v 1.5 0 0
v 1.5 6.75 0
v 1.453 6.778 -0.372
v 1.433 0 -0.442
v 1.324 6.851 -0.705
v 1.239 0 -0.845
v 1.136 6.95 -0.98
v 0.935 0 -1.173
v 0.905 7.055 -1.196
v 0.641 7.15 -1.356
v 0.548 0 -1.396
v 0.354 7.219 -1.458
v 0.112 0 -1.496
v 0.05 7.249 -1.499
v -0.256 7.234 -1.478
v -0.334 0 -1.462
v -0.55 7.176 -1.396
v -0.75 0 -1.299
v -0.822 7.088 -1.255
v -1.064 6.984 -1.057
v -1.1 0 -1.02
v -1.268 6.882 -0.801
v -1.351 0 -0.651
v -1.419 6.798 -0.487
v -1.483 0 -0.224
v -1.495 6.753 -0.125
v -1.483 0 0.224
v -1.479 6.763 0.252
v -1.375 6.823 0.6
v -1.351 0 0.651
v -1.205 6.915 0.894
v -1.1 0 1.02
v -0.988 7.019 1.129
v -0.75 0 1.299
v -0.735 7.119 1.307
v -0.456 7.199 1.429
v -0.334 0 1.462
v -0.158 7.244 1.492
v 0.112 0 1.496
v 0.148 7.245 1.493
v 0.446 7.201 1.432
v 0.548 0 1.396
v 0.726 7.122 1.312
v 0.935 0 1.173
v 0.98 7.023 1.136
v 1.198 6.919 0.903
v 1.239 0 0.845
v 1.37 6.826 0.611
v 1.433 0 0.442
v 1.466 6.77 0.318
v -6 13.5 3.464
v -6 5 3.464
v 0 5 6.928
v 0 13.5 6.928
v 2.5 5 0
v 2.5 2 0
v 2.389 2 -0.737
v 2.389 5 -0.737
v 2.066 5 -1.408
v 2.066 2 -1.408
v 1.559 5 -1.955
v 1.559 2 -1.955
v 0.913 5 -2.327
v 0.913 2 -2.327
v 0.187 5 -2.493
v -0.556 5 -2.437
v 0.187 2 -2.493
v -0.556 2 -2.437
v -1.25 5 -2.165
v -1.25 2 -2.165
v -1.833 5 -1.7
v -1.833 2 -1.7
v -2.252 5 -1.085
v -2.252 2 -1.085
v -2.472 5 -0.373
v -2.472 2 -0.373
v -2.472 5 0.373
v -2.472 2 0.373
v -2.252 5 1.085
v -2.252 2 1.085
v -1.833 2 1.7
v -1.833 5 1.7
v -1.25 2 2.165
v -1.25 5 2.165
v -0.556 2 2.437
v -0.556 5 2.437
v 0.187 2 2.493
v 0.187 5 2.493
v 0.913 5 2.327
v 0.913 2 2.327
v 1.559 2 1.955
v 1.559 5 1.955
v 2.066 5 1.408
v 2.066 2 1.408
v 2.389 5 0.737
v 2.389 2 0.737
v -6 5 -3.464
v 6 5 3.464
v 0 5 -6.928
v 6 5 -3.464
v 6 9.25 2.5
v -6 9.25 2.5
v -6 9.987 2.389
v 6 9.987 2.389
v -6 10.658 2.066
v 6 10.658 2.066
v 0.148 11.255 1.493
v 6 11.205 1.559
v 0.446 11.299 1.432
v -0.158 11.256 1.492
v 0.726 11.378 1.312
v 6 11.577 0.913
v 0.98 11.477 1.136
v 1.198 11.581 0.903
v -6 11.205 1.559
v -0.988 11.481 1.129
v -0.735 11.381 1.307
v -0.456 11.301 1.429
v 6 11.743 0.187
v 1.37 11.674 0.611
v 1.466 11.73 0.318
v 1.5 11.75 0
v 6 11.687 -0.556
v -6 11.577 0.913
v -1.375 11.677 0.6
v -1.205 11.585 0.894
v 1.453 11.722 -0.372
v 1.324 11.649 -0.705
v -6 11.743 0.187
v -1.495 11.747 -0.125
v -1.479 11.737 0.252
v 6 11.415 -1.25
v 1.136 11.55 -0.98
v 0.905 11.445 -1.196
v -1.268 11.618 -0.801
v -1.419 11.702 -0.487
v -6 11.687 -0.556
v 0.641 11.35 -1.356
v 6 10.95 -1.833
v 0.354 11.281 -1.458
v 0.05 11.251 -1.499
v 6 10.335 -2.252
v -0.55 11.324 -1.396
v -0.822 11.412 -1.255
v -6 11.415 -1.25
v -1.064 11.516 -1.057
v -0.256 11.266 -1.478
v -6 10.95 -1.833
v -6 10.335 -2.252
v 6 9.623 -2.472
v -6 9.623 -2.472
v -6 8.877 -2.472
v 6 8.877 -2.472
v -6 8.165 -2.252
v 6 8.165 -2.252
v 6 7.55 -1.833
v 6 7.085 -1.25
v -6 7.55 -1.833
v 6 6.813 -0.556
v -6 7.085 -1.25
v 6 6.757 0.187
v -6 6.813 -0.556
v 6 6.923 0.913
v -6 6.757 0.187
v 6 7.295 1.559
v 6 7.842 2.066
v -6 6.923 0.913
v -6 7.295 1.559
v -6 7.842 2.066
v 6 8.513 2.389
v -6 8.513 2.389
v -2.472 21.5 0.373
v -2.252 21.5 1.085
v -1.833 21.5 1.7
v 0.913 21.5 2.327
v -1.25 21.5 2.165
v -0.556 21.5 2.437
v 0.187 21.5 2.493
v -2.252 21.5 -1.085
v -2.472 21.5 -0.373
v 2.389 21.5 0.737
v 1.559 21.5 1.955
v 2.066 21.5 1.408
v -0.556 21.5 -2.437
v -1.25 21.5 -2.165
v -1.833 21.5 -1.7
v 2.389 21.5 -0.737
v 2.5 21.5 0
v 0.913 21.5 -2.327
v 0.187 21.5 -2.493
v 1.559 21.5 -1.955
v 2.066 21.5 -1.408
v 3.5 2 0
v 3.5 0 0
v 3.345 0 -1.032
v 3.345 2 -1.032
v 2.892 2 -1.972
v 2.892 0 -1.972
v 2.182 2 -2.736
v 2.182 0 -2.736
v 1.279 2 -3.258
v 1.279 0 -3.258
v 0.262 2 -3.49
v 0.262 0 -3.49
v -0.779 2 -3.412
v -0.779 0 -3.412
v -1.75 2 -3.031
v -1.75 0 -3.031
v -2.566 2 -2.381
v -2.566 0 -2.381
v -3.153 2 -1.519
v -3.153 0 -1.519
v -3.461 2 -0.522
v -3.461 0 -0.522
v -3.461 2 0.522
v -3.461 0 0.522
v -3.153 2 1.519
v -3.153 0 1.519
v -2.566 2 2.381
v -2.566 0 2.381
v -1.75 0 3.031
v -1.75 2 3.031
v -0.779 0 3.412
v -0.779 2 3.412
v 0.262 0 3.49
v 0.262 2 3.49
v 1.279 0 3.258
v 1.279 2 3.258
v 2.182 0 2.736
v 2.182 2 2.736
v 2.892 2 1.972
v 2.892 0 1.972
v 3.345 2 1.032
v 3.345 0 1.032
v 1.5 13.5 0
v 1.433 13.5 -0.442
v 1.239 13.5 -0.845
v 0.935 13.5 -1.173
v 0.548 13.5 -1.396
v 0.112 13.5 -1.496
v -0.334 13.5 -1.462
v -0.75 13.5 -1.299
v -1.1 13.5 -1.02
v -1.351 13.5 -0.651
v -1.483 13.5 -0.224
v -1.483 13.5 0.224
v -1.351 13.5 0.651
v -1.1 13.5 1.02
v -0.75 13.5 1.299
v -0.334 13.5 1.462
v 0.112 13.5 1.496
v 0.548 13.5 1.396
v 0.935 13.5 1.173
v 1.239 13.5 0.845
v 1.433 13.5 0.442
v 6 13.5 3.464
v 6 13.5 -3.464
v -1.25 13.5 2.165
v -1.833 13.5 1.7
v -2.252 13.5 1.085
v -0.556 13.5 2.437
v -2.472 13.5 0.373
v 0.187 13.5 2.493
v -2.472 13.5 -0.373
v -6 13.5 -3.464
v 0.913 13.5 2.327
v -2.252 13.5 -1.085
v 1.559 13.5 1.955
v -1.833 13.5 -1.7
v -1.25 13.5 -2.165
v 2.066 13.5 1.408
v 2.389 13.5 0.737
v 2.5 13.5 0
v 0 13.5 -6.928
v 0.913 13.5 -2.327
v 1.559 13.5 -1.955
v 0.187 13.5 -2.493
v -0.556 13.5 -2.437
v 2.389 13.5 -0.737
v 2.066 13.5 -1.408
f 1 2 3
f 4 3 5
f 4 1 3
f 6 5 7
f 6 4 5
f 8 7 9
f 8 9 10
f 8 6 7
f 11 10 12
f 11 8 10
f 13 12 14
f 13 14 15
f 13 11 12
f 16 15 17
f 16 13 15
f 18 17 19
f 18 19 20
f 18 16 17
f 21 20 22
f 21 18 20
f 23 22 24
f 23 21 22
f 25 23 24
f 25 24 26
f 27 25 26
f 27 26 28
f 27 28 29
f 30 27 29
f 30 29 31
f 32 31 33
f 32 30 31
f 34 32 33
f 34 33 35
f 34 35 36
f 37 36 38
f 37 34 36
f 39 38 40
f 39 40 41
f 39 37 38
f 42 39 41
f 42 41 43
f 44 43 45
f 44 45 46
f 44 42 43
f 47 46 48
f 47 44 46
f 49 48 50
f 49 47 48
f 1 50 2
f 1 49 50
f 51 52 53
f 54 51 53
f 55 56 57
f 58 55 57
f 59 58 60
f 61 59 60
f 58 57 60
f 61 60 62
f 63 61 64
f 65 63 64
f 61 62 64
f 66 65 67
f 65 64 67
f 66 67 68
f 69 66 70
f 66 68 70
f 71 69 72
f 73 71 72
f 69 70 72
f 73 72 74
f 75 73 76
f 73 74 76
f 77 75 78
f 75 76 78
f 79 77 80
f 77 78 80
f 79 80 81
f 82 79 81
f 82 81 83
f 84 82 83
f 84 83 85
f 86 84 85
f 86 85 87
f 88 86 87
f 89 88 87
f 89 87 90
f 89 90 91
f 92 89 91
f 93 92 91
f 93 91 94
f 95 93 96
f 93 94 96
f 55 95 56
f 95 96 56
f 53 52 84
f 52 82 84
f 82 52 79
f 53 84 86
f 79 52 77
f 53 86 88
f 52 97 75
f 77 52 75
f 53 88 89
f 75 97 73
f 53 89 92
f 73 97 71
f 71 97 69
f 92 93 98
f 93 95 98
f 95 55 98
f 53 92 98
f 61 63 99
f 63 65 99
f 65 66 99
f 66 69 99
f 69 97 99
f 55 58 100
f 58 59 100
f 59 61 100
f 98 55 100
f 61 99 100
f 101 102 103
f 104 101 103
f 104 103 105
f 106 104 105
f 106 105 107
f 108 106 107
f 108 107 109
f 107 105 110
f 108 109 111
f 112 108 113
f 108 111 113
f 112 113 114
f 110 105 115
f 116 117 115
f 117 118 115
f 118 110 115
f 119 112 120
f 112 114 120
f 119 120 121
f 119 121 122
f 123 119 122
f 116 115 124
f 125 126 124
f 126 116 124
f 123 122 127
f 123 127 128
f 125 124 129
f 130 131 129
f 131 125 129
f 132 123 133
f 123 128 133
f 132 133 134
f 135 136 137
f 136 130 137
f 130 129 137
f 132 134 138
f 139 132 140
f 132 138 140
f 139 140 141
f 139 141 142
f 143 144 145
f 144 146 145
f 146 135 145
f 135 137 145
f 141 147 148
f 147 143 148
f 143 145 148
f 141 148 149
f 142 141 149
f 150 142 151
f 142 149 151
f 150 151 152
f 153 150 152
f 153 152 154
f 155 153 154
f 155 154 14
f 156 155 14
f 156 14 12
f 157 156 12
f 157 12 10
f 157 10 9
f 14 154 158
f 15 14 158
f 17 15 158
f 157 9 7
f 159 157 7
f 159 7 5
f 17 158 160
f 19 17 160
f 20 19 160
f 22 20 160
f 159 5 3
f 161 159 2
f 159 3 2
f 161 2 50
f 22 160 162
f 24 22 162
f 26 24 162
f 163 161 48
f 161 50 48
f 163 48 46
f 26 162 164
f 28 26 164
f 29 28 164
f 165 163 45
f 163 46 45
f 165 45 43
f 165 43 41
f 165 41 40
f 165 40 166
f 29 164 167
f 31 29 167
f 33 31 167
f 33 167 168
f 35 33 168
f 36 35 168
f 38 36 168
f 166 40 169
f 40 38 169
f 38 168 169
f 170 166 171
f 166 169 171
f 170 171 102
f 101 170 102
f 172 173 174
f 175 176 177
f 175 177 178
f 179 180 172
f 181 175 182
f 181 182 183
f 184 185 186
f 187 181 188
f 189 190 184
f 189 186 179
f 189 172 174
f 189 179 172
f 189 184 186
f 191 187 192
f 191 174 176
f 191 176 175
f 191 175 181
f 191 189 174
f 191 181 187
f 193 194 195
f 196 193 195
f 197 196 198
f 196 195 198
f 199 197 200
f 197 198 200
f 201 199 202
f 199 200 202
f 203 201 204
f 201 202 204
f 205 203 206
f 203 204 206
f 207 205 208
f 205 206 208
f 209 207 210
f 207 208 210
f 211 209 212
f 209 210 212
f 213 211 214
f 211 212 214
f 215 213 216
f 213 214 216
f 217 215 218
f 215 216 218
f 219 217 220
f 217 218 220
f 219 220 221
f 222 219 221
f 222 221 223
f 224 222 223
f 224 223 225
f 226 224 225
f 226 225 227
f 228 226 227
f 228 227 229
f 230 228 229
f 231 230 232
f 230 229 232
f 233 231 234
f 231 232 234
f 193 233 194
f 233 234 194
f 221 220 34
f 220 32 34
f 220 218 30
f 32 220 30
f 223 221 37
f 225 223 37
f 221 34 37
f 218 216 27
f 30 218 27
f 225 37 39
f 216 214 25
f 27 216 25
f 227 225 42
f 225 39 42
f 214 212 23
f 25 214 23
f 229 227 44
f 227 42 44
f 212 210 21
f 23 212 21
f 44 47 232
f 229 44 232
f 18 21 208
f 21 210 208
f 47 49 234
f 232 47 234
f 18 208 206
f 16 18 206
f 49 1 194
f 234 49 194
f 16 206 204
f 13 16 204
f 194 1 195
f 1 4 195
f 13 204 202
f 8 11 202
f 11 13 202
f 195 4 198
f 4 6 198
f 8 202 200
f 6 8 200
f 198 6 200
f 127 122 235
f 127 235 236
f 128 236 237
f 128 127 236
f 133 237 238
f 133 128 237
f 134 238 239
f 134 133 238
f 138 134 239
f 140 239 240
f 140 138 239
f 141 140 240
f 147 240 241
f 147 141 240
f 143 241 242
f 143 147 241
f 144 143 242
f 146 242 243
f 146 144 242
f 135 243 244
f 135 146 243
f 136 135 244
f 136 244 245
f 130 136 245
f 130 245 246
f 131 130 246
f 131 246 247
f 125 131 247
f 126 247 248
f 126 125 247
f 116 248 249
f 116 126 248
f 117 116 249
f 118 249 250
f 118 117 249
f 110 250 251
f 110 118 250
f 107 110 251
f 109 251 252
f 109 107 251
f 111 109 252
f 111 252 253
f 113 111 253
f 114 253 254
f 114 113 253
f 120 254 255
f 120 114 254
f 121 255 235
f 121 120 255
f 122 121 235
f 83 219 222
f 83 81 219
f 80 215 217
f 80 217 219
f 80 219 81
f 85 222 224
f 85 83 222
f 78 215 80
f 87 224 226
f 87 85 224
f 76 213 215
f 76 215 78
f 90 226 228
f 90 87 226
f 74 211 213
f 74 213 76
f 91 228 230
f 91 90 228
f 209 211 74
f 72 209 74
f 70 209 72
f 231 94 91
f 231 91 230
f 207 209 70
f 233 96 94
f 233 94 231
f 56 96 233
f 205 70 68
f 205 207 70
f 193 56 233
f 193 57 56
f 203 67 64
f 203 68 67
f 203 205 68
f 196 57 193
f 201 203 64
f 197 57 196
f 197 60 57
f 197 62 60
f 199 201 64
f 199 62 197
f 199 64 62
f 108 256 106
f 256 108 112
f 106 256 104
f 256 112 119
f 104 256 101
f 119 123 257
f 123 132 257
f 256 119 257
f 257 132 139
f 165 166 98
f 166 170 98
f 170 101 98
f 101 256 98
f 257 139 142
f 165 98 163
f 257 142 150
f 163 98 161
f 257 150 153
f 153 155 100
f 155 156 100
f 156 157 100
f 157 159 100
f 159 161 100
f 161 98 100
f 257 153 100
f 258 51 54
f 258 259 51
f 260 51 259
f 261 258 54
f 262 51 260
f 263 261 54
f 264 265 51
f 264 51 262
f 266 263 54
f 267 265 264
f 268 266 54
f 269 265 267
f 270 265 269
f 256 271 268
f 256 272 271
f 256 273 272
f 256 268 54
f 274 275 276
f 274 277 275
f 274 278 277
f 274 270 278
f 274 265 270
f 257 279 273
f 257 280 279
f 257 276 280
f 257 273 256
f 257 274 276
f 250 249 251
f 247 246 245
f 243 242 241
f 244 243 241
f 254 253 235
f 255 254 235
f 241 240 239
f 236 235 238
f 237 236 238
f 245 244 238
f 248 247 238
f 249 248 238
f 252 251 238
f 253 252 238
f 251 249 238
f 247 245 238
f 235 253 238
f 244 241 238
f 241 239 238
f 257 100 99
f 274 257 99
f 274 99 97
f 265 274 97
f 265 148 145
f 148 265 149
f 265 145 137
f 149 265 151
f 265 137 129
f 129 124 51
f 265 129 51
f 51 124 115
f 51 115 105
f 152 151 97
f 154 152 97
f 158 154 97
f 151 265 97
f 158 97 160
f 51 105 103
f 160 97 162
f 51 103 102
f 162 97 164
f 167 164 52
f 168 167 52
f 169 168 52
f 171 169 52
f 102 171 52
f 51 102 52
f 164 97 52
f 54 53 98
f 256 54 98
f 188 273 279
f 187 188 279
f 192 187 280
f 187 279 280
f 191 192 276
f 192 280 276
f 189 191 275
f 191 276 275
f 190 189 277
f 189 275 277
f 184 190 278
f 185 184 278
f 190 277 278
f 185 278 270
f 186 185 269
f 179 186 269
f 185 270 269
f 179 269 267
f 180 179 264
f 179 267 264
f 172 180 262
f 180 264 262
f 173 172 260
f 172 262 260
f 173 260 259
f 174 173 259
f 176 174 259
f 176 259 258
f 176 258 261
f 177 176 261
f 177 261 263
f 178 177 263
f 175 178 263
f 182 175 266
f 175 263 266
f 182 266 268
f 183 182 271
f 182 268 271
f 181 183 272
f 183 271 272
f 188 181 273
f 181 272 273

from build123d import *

# Parameters (mm, degrees)
ESQUISSE1_R             = 3.5
ESQUISSE1_R_2           = 1.5
BOSS_EXTRU_1_DEPTH      = 2
ESQUISSE2_R             = 2.5
ESQUISSE2_R_2           = 1.5
BOSS_EXTRU_2_DEPTH      = 3
ESQUISSE3_R             = 1.5
BOSS_EXTRU_3_DEPTH      = 8.5
ESQUISSE4_R             = 2.5
BOSS_EXTRU_4_DEPTH      = 8
ESQUISSE5_R             = 2.5
ENL_V_MAT_EXTRU_1_DEPTH = 12


with BuildPart() as part:
    # Esquisse1 → Boss.-Extru.1 (new body)
    with BuildSketch(Plane(origin=(0, 0, 0), x_dir=(1, 0, 0), z_dir=(0, 1, 0))):
        Circle(ESQUISSE1_R)
        Circle(ESQUISSE1_R_2, mode=Mode.SUBTRACT)
    extrude(amount=BOSS_EXTRU_1_DEPTH)

    # Esquisse2 → Boss.-Extru.2 (add)
    with BuildSketch(Plane(origin=(0, 2, 0), x_dir=(1, 0, 0), z_dir=(0, 1, 0))):
        Circle(ESQUISSE2_R)
        Circle(ESQUISSE2_R_2, mode=Mode.SUBTRACT)
    extrude(amount=BOSS_EXTRU_2_DEPTH)

    # Esquisse3 → Boss.-Extru.3 (add)
    with BuildSketch(Plane(origin=(0, 5, 0), x_dir=(1, 0, 0), z_dir=(0, 1, 0))):
        Polygon((-6, 3.464101615), (-6, -3.464101615), (0, -6.92820323), (6, -3.464101615), (6, 3.464101615), (0, 6.92820323), align=None)
        Circle(ESQUISSE3_R, mode=Mode.SUBTRACT)
    extrude(amount=BOSS_EXTRU_3_DEPTH)

    # Esquisse4 → Boss.-Extru.4 (add)
    with BuildSketch(Plane(origin=(0, 13.5, 0), x_dir=(1, 0, 0), z_dir=(0, 1, 0))):
        Circle(ESQUISSE4_R)
    extrude(amount=BOSS_EXTRU_4_DEPTH)

    # Esquisse5 → Enlèv. mat.-Extru.1 (cut)
    with BuildSketch(Plane.ZY.offset(6)):
        with Locations((0, 9.25)):
            Circle(ESQUISSE5_R)
    extrude(amount=-ENL_V_MAT_EXTRU_1_DEPTH, mode=Mode.SUBTRACT)


solid = part.part
